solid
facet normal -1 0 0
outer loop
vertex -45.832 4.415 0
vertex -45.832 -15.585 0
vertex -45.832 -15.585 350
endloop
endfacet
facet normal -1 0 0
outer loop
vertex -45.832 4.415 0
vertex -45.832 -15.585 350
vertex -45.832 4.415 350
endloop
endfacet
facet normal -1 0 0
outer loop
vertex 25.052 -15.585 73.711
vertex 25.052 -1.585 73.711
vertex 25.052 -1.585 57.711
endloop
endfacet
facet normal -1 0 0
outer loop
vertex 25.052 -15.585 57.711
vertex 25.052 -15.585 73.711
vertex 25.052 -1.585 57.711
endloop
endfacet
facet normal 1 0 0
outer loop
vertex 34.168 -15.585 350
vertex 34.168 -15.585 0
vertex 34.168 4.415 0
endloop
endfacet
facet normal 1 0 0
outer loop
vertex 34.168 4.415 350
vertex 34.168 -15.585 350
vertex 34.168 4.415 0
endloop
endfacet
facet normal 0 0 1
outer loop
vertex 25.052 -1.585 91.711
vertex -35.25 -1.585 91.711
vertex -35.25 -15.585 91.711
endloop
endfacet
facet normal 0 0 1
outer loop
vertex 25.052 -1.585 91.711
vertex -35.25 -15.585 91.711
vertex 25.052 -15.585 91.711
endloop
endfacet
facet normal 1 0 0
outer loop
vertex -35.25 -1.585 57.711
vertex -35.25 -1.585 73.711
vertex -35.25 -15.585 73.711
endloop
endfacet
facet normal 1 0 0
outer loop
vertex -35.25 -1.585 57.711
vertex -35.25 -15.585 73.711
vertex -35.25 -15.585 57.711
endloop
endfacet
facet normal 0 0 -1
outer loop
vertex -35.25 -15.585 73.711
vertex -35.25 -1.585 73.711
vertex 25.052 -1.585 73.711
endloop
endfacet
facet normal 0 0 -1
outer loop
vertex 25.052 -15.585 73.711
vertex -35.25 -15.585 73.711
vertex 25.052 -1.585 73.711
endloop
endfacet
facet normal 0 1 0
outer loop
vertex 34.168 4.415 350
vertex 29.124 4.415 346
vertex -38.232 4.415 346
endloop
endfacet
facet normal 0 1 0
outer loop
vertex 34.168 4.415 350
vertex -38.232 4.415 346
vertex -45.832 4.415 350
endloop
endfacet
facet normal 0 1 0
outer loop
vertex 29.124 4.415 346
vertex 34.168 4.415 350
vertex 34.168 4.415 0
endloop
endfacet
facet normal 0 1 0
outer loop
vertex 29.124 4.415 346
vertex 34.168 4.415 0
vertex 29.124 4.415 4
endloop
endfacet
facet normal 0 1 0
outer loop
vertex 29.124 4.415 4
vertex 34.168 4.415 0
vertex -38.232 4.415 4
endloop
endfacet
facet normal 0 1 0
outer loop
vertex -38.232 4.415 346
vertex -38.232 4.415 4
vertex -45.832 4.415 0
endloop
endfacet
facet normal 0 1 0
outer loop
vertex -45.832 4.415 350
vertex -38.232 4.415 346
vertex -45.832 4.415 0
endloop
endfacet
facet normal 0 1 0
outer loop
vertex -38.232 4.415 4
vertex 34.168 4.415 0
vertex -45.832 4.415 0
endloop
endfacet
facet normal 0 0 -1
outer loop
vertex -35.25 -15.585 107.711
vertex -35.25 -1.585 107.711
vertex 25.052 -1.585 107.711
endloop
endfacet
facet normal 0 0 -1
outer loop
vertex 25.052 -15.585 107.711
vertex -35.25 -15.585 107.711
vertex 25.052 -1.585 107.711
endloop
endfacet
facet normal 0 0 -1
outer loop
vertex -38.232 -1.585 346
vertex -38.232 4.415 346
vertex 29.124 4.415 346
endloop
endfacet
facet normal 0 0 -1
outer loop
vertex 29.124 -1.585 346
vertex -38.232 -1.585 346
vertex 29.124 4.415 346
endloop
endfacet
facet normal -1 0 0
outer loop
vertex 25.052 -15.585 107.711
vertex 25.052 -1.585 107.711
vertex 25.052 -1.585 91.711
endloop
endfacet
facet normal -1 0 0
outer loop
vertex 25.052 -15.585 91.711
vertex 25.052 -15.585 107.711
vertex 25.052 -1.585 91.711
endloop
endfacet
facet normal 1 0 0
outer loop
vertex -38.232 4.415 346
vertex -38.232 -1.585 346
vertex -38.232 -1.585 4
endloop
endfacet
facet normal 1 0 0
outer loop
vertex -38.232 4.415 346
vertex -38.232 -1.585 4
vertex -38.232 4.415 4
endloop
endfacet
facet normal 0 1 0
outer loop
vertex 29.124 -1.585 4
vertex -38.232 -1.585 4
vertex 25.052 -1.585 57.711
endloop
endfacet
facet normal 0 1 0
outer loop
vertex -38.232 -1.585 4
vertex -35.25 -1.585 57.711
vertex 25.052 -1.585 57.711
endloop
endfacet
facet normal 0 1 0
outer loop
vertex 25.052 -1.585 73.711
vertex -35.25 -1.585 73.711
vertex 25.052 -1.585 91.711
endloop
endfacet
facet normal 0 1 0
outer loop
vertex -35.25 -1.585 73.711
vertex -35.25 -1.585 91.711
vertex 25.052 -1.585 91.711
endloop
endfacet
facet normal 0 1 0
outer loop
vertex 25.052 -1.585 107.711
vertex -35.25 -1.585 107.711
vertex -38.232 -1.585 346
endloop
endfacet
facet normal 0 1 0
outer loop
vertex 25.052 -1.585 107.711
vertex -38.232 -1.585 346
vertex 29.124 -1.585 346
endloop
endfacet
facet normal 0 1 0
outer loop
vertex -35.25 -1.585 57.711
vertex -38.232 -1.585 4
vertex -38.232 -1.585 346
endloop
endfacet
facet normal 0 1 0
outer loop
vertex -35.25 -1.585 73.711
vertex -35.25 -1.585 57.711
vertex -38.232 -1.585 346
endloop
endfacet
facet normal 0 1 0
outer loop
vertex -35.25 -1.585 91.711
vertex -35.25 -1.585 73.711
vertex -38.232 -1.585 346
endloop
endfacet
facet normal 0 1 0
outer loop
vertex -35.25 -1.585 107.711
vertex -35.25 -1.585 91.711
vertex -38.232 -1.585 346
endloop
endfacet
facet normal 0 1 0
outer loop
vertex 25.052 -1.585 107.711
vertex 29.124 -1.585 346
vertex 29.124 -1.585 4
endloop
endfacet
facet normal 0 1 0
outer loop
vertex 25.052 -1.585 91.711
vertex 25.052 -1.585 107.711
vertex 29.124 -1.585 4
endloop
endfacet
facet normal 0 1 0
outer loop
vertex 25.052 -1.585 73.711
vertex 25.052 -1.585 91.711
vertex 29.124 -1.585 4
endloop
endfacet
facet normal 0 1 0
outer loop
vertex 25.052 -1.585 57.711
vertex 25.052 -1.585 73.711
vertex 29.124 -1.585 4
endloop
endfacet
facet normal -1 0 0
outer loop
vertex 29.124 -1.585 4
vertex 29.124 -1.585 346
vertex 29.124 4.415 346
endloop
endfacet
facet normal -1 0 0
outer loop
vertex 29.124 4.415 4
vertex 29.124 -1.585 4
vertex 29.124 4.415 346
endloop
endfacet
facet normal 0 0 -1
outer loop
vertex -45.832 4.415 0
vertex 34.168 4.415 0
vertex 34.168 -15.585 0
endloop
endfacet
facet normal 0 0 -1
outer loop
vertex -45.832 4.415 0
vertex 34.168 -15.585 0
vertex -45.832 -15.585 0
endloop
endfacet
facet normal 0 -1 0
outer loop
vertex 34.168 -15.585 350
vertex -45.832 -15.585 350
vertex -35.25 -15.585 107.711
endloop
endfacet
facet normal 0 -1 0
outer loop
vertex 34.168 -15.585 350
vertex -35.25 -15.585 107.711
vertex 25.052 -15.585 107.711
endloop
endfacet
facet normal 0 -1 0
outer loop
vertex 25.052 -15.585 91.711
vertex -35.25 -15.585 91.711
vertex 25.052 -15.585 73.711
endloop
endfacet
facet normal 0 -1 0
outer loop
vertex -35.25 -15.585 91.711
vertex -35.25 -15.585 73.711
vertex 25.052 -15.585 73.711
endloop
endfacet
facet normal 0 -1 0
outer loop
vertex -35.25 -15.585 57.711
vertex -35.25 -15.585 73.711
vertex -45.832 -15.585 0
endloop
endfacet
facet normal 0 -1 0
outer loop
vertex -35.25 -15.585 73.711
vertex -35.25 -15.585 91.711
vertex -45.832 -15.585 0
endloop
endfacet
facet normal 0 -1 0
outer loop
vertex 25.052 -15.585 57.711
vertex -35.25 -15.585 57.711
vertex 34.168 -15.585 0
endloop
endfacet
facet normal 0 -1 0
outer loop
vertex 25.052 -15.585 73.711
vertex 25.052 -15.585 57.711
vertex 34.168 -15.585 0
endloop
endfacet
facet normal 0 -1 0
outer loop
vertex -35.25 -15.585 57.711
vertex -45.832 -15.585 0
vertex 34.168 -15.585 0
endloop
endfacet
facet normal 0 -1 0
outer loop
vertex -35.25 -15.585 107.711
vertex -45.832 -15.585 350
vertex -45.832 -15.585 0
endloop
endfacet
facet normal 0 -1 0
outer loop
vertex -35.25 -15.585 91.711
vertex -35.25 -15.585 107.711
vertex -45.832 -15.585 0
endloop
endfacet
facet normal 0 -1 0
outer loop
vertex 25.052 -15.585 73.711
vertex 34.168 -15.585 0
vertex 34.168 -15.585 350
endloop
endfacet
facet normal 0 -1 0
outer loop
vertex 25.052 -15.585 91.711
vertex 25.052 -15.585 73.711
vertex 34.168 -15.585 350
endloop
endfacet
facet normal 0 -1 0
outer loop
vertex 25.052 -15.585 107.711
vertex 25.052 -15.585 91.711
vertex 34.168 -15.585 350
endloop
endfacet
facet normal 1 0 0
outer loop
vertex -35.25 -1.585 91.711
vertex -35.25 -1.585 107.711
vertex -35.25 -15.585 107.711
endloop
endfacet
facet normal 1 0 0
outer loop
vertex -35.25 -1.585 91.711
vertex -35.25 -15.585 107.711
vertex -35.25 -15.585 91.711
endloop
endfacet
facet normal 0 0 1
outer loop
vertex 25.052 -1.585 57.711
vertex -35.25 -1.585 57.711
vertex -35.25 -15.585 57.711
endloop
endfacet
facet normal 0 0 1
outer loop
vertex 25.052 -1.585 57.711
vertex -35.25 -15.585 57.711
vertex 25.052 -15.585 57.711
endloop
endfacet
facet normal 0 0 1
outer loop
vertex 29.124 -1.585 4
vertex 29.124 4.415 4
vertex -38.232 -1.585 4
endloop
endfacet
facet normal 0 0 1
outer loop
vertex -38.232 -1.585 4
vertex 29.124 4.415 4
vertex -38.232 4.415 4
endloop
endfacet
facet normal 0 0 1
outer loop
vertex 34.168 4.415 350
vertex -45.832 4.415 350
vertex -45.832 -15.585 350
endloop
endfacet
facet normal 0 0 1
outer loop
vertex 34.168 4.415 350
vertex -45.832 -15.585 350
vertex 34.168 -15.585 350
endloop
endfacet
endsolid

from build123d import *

# Parameters (mm, degrees)
SKETCH_1_W          = 80
SKETCH_1_H          = 20
EXTRUDE_1_DEPTH     = 350
SKETCH_2_W          = 67.355648201
SKETCH_2_H          = 6
CUT_EXTRUDE_1_DEPTH = 351
SKETCH_3_W          = 60.301963697
SKETCH_3_H          = 16
CUT_EXTRUDE_2_DEPTH = 15
SKETCH_4_W          = 67.355648201
SKETCH_4_H          = 6
EXTRUDE_2_DEPTH     = 4
SKETCH_5_W          = 67.355648201
SKETCH_5_H          = 6
EXTRUDE_3_DEPTH     = 4


with BuildPart() as part:
    # 草图1 → 凸台-拉伸1 (new body)
    with BuildSketch(Plane.XY):
        with Locations((-5.831622177, -5.58518109)):
            Rectangle(SKETCH_1_W, SKETCH_1_H)
    extrude(amount=EXTRUDE_1_DEPTH)

    # 草图2 → 切除-拉伸1 (cut, through all)
    with BuildSketch(Plane.XY.offset(350)):
        with Locations((-4.554011248, 1.41481891)):
            Rectangle(SKETCH_2_W, SKETCH_2_H)
    extrude(amount=-CUT_EXTRUDE_1_DEPTH, mode=Mode.SUBTRACT)

    # 草图3 → 切除-拉伸2 (cut, through all)
    with BuildSketch(Plane(origin=(0, -1.58518109, 0), x_dir=(1, 0, 0), z_dir=(0, 1, 0))):
        with Locations((-5.099475916, -65.71132948)):
            Rectangle(SKETCH_3_W, SKETCH_3_H)
        with Locations((-5.099475916, -99.71132948)):
            Rectangle(SKETCH_3_W, SKETCH_3_H)
    extrude(amount=-CUT_EXTRUDE_2_DEPTH, mode=Mode.SUBTRACT)

    # 草图4 → 凸台-拉伸2 (add)
    with BuildSketch(Plane.XY.offset(350)):
        with Locations((-4.554011248, 1.41481891)):
            Rectangle(SKETCH_4_W, SKETCH_4_H)
    extrude(amount=-EXTRUDE_2_DEPTH)

    # 草图5 → 凸台-拉伸3 (add)
    with BuildSketch(Plane(origin=(0, 0, 0), x_dir=(-1, 0, 0), z_dir=(0, 0, -1))):
        with Locations((4.554011248, 1.41481891)):
            Rectangle(SKETCH_5_W, SKETCH_5_H)
    extrude(amount=-EXTRUDE_3_DEPTH)


solid = part.part
